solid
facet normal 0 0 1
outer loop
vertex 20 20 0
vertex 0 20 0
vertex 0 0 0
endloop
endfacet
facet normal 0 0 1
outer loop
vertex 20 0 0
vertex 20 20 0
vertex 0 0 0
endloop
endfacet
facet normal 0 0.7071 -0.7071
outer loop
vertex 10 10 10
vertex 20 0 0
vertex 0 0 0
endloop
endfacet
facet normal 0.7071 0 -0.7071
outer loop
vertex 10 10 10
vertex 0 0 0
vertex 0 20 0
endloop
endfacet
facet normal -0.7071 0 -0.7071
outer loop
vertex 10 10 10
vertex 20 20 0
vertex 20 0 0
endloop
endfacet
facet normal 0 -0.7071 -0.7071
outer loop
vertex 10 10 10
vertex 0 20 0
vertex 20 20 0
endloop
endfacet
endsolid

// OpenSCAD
polyhedron(
points = [[0,0,0],[0,20,0],[20,20,0],[20,0,0],[10,10,10]],
triangles = [[0,1,2],[0,2,3],[0,3,4],[1,0,4],[3,2,4],[2,1,4]]
);
